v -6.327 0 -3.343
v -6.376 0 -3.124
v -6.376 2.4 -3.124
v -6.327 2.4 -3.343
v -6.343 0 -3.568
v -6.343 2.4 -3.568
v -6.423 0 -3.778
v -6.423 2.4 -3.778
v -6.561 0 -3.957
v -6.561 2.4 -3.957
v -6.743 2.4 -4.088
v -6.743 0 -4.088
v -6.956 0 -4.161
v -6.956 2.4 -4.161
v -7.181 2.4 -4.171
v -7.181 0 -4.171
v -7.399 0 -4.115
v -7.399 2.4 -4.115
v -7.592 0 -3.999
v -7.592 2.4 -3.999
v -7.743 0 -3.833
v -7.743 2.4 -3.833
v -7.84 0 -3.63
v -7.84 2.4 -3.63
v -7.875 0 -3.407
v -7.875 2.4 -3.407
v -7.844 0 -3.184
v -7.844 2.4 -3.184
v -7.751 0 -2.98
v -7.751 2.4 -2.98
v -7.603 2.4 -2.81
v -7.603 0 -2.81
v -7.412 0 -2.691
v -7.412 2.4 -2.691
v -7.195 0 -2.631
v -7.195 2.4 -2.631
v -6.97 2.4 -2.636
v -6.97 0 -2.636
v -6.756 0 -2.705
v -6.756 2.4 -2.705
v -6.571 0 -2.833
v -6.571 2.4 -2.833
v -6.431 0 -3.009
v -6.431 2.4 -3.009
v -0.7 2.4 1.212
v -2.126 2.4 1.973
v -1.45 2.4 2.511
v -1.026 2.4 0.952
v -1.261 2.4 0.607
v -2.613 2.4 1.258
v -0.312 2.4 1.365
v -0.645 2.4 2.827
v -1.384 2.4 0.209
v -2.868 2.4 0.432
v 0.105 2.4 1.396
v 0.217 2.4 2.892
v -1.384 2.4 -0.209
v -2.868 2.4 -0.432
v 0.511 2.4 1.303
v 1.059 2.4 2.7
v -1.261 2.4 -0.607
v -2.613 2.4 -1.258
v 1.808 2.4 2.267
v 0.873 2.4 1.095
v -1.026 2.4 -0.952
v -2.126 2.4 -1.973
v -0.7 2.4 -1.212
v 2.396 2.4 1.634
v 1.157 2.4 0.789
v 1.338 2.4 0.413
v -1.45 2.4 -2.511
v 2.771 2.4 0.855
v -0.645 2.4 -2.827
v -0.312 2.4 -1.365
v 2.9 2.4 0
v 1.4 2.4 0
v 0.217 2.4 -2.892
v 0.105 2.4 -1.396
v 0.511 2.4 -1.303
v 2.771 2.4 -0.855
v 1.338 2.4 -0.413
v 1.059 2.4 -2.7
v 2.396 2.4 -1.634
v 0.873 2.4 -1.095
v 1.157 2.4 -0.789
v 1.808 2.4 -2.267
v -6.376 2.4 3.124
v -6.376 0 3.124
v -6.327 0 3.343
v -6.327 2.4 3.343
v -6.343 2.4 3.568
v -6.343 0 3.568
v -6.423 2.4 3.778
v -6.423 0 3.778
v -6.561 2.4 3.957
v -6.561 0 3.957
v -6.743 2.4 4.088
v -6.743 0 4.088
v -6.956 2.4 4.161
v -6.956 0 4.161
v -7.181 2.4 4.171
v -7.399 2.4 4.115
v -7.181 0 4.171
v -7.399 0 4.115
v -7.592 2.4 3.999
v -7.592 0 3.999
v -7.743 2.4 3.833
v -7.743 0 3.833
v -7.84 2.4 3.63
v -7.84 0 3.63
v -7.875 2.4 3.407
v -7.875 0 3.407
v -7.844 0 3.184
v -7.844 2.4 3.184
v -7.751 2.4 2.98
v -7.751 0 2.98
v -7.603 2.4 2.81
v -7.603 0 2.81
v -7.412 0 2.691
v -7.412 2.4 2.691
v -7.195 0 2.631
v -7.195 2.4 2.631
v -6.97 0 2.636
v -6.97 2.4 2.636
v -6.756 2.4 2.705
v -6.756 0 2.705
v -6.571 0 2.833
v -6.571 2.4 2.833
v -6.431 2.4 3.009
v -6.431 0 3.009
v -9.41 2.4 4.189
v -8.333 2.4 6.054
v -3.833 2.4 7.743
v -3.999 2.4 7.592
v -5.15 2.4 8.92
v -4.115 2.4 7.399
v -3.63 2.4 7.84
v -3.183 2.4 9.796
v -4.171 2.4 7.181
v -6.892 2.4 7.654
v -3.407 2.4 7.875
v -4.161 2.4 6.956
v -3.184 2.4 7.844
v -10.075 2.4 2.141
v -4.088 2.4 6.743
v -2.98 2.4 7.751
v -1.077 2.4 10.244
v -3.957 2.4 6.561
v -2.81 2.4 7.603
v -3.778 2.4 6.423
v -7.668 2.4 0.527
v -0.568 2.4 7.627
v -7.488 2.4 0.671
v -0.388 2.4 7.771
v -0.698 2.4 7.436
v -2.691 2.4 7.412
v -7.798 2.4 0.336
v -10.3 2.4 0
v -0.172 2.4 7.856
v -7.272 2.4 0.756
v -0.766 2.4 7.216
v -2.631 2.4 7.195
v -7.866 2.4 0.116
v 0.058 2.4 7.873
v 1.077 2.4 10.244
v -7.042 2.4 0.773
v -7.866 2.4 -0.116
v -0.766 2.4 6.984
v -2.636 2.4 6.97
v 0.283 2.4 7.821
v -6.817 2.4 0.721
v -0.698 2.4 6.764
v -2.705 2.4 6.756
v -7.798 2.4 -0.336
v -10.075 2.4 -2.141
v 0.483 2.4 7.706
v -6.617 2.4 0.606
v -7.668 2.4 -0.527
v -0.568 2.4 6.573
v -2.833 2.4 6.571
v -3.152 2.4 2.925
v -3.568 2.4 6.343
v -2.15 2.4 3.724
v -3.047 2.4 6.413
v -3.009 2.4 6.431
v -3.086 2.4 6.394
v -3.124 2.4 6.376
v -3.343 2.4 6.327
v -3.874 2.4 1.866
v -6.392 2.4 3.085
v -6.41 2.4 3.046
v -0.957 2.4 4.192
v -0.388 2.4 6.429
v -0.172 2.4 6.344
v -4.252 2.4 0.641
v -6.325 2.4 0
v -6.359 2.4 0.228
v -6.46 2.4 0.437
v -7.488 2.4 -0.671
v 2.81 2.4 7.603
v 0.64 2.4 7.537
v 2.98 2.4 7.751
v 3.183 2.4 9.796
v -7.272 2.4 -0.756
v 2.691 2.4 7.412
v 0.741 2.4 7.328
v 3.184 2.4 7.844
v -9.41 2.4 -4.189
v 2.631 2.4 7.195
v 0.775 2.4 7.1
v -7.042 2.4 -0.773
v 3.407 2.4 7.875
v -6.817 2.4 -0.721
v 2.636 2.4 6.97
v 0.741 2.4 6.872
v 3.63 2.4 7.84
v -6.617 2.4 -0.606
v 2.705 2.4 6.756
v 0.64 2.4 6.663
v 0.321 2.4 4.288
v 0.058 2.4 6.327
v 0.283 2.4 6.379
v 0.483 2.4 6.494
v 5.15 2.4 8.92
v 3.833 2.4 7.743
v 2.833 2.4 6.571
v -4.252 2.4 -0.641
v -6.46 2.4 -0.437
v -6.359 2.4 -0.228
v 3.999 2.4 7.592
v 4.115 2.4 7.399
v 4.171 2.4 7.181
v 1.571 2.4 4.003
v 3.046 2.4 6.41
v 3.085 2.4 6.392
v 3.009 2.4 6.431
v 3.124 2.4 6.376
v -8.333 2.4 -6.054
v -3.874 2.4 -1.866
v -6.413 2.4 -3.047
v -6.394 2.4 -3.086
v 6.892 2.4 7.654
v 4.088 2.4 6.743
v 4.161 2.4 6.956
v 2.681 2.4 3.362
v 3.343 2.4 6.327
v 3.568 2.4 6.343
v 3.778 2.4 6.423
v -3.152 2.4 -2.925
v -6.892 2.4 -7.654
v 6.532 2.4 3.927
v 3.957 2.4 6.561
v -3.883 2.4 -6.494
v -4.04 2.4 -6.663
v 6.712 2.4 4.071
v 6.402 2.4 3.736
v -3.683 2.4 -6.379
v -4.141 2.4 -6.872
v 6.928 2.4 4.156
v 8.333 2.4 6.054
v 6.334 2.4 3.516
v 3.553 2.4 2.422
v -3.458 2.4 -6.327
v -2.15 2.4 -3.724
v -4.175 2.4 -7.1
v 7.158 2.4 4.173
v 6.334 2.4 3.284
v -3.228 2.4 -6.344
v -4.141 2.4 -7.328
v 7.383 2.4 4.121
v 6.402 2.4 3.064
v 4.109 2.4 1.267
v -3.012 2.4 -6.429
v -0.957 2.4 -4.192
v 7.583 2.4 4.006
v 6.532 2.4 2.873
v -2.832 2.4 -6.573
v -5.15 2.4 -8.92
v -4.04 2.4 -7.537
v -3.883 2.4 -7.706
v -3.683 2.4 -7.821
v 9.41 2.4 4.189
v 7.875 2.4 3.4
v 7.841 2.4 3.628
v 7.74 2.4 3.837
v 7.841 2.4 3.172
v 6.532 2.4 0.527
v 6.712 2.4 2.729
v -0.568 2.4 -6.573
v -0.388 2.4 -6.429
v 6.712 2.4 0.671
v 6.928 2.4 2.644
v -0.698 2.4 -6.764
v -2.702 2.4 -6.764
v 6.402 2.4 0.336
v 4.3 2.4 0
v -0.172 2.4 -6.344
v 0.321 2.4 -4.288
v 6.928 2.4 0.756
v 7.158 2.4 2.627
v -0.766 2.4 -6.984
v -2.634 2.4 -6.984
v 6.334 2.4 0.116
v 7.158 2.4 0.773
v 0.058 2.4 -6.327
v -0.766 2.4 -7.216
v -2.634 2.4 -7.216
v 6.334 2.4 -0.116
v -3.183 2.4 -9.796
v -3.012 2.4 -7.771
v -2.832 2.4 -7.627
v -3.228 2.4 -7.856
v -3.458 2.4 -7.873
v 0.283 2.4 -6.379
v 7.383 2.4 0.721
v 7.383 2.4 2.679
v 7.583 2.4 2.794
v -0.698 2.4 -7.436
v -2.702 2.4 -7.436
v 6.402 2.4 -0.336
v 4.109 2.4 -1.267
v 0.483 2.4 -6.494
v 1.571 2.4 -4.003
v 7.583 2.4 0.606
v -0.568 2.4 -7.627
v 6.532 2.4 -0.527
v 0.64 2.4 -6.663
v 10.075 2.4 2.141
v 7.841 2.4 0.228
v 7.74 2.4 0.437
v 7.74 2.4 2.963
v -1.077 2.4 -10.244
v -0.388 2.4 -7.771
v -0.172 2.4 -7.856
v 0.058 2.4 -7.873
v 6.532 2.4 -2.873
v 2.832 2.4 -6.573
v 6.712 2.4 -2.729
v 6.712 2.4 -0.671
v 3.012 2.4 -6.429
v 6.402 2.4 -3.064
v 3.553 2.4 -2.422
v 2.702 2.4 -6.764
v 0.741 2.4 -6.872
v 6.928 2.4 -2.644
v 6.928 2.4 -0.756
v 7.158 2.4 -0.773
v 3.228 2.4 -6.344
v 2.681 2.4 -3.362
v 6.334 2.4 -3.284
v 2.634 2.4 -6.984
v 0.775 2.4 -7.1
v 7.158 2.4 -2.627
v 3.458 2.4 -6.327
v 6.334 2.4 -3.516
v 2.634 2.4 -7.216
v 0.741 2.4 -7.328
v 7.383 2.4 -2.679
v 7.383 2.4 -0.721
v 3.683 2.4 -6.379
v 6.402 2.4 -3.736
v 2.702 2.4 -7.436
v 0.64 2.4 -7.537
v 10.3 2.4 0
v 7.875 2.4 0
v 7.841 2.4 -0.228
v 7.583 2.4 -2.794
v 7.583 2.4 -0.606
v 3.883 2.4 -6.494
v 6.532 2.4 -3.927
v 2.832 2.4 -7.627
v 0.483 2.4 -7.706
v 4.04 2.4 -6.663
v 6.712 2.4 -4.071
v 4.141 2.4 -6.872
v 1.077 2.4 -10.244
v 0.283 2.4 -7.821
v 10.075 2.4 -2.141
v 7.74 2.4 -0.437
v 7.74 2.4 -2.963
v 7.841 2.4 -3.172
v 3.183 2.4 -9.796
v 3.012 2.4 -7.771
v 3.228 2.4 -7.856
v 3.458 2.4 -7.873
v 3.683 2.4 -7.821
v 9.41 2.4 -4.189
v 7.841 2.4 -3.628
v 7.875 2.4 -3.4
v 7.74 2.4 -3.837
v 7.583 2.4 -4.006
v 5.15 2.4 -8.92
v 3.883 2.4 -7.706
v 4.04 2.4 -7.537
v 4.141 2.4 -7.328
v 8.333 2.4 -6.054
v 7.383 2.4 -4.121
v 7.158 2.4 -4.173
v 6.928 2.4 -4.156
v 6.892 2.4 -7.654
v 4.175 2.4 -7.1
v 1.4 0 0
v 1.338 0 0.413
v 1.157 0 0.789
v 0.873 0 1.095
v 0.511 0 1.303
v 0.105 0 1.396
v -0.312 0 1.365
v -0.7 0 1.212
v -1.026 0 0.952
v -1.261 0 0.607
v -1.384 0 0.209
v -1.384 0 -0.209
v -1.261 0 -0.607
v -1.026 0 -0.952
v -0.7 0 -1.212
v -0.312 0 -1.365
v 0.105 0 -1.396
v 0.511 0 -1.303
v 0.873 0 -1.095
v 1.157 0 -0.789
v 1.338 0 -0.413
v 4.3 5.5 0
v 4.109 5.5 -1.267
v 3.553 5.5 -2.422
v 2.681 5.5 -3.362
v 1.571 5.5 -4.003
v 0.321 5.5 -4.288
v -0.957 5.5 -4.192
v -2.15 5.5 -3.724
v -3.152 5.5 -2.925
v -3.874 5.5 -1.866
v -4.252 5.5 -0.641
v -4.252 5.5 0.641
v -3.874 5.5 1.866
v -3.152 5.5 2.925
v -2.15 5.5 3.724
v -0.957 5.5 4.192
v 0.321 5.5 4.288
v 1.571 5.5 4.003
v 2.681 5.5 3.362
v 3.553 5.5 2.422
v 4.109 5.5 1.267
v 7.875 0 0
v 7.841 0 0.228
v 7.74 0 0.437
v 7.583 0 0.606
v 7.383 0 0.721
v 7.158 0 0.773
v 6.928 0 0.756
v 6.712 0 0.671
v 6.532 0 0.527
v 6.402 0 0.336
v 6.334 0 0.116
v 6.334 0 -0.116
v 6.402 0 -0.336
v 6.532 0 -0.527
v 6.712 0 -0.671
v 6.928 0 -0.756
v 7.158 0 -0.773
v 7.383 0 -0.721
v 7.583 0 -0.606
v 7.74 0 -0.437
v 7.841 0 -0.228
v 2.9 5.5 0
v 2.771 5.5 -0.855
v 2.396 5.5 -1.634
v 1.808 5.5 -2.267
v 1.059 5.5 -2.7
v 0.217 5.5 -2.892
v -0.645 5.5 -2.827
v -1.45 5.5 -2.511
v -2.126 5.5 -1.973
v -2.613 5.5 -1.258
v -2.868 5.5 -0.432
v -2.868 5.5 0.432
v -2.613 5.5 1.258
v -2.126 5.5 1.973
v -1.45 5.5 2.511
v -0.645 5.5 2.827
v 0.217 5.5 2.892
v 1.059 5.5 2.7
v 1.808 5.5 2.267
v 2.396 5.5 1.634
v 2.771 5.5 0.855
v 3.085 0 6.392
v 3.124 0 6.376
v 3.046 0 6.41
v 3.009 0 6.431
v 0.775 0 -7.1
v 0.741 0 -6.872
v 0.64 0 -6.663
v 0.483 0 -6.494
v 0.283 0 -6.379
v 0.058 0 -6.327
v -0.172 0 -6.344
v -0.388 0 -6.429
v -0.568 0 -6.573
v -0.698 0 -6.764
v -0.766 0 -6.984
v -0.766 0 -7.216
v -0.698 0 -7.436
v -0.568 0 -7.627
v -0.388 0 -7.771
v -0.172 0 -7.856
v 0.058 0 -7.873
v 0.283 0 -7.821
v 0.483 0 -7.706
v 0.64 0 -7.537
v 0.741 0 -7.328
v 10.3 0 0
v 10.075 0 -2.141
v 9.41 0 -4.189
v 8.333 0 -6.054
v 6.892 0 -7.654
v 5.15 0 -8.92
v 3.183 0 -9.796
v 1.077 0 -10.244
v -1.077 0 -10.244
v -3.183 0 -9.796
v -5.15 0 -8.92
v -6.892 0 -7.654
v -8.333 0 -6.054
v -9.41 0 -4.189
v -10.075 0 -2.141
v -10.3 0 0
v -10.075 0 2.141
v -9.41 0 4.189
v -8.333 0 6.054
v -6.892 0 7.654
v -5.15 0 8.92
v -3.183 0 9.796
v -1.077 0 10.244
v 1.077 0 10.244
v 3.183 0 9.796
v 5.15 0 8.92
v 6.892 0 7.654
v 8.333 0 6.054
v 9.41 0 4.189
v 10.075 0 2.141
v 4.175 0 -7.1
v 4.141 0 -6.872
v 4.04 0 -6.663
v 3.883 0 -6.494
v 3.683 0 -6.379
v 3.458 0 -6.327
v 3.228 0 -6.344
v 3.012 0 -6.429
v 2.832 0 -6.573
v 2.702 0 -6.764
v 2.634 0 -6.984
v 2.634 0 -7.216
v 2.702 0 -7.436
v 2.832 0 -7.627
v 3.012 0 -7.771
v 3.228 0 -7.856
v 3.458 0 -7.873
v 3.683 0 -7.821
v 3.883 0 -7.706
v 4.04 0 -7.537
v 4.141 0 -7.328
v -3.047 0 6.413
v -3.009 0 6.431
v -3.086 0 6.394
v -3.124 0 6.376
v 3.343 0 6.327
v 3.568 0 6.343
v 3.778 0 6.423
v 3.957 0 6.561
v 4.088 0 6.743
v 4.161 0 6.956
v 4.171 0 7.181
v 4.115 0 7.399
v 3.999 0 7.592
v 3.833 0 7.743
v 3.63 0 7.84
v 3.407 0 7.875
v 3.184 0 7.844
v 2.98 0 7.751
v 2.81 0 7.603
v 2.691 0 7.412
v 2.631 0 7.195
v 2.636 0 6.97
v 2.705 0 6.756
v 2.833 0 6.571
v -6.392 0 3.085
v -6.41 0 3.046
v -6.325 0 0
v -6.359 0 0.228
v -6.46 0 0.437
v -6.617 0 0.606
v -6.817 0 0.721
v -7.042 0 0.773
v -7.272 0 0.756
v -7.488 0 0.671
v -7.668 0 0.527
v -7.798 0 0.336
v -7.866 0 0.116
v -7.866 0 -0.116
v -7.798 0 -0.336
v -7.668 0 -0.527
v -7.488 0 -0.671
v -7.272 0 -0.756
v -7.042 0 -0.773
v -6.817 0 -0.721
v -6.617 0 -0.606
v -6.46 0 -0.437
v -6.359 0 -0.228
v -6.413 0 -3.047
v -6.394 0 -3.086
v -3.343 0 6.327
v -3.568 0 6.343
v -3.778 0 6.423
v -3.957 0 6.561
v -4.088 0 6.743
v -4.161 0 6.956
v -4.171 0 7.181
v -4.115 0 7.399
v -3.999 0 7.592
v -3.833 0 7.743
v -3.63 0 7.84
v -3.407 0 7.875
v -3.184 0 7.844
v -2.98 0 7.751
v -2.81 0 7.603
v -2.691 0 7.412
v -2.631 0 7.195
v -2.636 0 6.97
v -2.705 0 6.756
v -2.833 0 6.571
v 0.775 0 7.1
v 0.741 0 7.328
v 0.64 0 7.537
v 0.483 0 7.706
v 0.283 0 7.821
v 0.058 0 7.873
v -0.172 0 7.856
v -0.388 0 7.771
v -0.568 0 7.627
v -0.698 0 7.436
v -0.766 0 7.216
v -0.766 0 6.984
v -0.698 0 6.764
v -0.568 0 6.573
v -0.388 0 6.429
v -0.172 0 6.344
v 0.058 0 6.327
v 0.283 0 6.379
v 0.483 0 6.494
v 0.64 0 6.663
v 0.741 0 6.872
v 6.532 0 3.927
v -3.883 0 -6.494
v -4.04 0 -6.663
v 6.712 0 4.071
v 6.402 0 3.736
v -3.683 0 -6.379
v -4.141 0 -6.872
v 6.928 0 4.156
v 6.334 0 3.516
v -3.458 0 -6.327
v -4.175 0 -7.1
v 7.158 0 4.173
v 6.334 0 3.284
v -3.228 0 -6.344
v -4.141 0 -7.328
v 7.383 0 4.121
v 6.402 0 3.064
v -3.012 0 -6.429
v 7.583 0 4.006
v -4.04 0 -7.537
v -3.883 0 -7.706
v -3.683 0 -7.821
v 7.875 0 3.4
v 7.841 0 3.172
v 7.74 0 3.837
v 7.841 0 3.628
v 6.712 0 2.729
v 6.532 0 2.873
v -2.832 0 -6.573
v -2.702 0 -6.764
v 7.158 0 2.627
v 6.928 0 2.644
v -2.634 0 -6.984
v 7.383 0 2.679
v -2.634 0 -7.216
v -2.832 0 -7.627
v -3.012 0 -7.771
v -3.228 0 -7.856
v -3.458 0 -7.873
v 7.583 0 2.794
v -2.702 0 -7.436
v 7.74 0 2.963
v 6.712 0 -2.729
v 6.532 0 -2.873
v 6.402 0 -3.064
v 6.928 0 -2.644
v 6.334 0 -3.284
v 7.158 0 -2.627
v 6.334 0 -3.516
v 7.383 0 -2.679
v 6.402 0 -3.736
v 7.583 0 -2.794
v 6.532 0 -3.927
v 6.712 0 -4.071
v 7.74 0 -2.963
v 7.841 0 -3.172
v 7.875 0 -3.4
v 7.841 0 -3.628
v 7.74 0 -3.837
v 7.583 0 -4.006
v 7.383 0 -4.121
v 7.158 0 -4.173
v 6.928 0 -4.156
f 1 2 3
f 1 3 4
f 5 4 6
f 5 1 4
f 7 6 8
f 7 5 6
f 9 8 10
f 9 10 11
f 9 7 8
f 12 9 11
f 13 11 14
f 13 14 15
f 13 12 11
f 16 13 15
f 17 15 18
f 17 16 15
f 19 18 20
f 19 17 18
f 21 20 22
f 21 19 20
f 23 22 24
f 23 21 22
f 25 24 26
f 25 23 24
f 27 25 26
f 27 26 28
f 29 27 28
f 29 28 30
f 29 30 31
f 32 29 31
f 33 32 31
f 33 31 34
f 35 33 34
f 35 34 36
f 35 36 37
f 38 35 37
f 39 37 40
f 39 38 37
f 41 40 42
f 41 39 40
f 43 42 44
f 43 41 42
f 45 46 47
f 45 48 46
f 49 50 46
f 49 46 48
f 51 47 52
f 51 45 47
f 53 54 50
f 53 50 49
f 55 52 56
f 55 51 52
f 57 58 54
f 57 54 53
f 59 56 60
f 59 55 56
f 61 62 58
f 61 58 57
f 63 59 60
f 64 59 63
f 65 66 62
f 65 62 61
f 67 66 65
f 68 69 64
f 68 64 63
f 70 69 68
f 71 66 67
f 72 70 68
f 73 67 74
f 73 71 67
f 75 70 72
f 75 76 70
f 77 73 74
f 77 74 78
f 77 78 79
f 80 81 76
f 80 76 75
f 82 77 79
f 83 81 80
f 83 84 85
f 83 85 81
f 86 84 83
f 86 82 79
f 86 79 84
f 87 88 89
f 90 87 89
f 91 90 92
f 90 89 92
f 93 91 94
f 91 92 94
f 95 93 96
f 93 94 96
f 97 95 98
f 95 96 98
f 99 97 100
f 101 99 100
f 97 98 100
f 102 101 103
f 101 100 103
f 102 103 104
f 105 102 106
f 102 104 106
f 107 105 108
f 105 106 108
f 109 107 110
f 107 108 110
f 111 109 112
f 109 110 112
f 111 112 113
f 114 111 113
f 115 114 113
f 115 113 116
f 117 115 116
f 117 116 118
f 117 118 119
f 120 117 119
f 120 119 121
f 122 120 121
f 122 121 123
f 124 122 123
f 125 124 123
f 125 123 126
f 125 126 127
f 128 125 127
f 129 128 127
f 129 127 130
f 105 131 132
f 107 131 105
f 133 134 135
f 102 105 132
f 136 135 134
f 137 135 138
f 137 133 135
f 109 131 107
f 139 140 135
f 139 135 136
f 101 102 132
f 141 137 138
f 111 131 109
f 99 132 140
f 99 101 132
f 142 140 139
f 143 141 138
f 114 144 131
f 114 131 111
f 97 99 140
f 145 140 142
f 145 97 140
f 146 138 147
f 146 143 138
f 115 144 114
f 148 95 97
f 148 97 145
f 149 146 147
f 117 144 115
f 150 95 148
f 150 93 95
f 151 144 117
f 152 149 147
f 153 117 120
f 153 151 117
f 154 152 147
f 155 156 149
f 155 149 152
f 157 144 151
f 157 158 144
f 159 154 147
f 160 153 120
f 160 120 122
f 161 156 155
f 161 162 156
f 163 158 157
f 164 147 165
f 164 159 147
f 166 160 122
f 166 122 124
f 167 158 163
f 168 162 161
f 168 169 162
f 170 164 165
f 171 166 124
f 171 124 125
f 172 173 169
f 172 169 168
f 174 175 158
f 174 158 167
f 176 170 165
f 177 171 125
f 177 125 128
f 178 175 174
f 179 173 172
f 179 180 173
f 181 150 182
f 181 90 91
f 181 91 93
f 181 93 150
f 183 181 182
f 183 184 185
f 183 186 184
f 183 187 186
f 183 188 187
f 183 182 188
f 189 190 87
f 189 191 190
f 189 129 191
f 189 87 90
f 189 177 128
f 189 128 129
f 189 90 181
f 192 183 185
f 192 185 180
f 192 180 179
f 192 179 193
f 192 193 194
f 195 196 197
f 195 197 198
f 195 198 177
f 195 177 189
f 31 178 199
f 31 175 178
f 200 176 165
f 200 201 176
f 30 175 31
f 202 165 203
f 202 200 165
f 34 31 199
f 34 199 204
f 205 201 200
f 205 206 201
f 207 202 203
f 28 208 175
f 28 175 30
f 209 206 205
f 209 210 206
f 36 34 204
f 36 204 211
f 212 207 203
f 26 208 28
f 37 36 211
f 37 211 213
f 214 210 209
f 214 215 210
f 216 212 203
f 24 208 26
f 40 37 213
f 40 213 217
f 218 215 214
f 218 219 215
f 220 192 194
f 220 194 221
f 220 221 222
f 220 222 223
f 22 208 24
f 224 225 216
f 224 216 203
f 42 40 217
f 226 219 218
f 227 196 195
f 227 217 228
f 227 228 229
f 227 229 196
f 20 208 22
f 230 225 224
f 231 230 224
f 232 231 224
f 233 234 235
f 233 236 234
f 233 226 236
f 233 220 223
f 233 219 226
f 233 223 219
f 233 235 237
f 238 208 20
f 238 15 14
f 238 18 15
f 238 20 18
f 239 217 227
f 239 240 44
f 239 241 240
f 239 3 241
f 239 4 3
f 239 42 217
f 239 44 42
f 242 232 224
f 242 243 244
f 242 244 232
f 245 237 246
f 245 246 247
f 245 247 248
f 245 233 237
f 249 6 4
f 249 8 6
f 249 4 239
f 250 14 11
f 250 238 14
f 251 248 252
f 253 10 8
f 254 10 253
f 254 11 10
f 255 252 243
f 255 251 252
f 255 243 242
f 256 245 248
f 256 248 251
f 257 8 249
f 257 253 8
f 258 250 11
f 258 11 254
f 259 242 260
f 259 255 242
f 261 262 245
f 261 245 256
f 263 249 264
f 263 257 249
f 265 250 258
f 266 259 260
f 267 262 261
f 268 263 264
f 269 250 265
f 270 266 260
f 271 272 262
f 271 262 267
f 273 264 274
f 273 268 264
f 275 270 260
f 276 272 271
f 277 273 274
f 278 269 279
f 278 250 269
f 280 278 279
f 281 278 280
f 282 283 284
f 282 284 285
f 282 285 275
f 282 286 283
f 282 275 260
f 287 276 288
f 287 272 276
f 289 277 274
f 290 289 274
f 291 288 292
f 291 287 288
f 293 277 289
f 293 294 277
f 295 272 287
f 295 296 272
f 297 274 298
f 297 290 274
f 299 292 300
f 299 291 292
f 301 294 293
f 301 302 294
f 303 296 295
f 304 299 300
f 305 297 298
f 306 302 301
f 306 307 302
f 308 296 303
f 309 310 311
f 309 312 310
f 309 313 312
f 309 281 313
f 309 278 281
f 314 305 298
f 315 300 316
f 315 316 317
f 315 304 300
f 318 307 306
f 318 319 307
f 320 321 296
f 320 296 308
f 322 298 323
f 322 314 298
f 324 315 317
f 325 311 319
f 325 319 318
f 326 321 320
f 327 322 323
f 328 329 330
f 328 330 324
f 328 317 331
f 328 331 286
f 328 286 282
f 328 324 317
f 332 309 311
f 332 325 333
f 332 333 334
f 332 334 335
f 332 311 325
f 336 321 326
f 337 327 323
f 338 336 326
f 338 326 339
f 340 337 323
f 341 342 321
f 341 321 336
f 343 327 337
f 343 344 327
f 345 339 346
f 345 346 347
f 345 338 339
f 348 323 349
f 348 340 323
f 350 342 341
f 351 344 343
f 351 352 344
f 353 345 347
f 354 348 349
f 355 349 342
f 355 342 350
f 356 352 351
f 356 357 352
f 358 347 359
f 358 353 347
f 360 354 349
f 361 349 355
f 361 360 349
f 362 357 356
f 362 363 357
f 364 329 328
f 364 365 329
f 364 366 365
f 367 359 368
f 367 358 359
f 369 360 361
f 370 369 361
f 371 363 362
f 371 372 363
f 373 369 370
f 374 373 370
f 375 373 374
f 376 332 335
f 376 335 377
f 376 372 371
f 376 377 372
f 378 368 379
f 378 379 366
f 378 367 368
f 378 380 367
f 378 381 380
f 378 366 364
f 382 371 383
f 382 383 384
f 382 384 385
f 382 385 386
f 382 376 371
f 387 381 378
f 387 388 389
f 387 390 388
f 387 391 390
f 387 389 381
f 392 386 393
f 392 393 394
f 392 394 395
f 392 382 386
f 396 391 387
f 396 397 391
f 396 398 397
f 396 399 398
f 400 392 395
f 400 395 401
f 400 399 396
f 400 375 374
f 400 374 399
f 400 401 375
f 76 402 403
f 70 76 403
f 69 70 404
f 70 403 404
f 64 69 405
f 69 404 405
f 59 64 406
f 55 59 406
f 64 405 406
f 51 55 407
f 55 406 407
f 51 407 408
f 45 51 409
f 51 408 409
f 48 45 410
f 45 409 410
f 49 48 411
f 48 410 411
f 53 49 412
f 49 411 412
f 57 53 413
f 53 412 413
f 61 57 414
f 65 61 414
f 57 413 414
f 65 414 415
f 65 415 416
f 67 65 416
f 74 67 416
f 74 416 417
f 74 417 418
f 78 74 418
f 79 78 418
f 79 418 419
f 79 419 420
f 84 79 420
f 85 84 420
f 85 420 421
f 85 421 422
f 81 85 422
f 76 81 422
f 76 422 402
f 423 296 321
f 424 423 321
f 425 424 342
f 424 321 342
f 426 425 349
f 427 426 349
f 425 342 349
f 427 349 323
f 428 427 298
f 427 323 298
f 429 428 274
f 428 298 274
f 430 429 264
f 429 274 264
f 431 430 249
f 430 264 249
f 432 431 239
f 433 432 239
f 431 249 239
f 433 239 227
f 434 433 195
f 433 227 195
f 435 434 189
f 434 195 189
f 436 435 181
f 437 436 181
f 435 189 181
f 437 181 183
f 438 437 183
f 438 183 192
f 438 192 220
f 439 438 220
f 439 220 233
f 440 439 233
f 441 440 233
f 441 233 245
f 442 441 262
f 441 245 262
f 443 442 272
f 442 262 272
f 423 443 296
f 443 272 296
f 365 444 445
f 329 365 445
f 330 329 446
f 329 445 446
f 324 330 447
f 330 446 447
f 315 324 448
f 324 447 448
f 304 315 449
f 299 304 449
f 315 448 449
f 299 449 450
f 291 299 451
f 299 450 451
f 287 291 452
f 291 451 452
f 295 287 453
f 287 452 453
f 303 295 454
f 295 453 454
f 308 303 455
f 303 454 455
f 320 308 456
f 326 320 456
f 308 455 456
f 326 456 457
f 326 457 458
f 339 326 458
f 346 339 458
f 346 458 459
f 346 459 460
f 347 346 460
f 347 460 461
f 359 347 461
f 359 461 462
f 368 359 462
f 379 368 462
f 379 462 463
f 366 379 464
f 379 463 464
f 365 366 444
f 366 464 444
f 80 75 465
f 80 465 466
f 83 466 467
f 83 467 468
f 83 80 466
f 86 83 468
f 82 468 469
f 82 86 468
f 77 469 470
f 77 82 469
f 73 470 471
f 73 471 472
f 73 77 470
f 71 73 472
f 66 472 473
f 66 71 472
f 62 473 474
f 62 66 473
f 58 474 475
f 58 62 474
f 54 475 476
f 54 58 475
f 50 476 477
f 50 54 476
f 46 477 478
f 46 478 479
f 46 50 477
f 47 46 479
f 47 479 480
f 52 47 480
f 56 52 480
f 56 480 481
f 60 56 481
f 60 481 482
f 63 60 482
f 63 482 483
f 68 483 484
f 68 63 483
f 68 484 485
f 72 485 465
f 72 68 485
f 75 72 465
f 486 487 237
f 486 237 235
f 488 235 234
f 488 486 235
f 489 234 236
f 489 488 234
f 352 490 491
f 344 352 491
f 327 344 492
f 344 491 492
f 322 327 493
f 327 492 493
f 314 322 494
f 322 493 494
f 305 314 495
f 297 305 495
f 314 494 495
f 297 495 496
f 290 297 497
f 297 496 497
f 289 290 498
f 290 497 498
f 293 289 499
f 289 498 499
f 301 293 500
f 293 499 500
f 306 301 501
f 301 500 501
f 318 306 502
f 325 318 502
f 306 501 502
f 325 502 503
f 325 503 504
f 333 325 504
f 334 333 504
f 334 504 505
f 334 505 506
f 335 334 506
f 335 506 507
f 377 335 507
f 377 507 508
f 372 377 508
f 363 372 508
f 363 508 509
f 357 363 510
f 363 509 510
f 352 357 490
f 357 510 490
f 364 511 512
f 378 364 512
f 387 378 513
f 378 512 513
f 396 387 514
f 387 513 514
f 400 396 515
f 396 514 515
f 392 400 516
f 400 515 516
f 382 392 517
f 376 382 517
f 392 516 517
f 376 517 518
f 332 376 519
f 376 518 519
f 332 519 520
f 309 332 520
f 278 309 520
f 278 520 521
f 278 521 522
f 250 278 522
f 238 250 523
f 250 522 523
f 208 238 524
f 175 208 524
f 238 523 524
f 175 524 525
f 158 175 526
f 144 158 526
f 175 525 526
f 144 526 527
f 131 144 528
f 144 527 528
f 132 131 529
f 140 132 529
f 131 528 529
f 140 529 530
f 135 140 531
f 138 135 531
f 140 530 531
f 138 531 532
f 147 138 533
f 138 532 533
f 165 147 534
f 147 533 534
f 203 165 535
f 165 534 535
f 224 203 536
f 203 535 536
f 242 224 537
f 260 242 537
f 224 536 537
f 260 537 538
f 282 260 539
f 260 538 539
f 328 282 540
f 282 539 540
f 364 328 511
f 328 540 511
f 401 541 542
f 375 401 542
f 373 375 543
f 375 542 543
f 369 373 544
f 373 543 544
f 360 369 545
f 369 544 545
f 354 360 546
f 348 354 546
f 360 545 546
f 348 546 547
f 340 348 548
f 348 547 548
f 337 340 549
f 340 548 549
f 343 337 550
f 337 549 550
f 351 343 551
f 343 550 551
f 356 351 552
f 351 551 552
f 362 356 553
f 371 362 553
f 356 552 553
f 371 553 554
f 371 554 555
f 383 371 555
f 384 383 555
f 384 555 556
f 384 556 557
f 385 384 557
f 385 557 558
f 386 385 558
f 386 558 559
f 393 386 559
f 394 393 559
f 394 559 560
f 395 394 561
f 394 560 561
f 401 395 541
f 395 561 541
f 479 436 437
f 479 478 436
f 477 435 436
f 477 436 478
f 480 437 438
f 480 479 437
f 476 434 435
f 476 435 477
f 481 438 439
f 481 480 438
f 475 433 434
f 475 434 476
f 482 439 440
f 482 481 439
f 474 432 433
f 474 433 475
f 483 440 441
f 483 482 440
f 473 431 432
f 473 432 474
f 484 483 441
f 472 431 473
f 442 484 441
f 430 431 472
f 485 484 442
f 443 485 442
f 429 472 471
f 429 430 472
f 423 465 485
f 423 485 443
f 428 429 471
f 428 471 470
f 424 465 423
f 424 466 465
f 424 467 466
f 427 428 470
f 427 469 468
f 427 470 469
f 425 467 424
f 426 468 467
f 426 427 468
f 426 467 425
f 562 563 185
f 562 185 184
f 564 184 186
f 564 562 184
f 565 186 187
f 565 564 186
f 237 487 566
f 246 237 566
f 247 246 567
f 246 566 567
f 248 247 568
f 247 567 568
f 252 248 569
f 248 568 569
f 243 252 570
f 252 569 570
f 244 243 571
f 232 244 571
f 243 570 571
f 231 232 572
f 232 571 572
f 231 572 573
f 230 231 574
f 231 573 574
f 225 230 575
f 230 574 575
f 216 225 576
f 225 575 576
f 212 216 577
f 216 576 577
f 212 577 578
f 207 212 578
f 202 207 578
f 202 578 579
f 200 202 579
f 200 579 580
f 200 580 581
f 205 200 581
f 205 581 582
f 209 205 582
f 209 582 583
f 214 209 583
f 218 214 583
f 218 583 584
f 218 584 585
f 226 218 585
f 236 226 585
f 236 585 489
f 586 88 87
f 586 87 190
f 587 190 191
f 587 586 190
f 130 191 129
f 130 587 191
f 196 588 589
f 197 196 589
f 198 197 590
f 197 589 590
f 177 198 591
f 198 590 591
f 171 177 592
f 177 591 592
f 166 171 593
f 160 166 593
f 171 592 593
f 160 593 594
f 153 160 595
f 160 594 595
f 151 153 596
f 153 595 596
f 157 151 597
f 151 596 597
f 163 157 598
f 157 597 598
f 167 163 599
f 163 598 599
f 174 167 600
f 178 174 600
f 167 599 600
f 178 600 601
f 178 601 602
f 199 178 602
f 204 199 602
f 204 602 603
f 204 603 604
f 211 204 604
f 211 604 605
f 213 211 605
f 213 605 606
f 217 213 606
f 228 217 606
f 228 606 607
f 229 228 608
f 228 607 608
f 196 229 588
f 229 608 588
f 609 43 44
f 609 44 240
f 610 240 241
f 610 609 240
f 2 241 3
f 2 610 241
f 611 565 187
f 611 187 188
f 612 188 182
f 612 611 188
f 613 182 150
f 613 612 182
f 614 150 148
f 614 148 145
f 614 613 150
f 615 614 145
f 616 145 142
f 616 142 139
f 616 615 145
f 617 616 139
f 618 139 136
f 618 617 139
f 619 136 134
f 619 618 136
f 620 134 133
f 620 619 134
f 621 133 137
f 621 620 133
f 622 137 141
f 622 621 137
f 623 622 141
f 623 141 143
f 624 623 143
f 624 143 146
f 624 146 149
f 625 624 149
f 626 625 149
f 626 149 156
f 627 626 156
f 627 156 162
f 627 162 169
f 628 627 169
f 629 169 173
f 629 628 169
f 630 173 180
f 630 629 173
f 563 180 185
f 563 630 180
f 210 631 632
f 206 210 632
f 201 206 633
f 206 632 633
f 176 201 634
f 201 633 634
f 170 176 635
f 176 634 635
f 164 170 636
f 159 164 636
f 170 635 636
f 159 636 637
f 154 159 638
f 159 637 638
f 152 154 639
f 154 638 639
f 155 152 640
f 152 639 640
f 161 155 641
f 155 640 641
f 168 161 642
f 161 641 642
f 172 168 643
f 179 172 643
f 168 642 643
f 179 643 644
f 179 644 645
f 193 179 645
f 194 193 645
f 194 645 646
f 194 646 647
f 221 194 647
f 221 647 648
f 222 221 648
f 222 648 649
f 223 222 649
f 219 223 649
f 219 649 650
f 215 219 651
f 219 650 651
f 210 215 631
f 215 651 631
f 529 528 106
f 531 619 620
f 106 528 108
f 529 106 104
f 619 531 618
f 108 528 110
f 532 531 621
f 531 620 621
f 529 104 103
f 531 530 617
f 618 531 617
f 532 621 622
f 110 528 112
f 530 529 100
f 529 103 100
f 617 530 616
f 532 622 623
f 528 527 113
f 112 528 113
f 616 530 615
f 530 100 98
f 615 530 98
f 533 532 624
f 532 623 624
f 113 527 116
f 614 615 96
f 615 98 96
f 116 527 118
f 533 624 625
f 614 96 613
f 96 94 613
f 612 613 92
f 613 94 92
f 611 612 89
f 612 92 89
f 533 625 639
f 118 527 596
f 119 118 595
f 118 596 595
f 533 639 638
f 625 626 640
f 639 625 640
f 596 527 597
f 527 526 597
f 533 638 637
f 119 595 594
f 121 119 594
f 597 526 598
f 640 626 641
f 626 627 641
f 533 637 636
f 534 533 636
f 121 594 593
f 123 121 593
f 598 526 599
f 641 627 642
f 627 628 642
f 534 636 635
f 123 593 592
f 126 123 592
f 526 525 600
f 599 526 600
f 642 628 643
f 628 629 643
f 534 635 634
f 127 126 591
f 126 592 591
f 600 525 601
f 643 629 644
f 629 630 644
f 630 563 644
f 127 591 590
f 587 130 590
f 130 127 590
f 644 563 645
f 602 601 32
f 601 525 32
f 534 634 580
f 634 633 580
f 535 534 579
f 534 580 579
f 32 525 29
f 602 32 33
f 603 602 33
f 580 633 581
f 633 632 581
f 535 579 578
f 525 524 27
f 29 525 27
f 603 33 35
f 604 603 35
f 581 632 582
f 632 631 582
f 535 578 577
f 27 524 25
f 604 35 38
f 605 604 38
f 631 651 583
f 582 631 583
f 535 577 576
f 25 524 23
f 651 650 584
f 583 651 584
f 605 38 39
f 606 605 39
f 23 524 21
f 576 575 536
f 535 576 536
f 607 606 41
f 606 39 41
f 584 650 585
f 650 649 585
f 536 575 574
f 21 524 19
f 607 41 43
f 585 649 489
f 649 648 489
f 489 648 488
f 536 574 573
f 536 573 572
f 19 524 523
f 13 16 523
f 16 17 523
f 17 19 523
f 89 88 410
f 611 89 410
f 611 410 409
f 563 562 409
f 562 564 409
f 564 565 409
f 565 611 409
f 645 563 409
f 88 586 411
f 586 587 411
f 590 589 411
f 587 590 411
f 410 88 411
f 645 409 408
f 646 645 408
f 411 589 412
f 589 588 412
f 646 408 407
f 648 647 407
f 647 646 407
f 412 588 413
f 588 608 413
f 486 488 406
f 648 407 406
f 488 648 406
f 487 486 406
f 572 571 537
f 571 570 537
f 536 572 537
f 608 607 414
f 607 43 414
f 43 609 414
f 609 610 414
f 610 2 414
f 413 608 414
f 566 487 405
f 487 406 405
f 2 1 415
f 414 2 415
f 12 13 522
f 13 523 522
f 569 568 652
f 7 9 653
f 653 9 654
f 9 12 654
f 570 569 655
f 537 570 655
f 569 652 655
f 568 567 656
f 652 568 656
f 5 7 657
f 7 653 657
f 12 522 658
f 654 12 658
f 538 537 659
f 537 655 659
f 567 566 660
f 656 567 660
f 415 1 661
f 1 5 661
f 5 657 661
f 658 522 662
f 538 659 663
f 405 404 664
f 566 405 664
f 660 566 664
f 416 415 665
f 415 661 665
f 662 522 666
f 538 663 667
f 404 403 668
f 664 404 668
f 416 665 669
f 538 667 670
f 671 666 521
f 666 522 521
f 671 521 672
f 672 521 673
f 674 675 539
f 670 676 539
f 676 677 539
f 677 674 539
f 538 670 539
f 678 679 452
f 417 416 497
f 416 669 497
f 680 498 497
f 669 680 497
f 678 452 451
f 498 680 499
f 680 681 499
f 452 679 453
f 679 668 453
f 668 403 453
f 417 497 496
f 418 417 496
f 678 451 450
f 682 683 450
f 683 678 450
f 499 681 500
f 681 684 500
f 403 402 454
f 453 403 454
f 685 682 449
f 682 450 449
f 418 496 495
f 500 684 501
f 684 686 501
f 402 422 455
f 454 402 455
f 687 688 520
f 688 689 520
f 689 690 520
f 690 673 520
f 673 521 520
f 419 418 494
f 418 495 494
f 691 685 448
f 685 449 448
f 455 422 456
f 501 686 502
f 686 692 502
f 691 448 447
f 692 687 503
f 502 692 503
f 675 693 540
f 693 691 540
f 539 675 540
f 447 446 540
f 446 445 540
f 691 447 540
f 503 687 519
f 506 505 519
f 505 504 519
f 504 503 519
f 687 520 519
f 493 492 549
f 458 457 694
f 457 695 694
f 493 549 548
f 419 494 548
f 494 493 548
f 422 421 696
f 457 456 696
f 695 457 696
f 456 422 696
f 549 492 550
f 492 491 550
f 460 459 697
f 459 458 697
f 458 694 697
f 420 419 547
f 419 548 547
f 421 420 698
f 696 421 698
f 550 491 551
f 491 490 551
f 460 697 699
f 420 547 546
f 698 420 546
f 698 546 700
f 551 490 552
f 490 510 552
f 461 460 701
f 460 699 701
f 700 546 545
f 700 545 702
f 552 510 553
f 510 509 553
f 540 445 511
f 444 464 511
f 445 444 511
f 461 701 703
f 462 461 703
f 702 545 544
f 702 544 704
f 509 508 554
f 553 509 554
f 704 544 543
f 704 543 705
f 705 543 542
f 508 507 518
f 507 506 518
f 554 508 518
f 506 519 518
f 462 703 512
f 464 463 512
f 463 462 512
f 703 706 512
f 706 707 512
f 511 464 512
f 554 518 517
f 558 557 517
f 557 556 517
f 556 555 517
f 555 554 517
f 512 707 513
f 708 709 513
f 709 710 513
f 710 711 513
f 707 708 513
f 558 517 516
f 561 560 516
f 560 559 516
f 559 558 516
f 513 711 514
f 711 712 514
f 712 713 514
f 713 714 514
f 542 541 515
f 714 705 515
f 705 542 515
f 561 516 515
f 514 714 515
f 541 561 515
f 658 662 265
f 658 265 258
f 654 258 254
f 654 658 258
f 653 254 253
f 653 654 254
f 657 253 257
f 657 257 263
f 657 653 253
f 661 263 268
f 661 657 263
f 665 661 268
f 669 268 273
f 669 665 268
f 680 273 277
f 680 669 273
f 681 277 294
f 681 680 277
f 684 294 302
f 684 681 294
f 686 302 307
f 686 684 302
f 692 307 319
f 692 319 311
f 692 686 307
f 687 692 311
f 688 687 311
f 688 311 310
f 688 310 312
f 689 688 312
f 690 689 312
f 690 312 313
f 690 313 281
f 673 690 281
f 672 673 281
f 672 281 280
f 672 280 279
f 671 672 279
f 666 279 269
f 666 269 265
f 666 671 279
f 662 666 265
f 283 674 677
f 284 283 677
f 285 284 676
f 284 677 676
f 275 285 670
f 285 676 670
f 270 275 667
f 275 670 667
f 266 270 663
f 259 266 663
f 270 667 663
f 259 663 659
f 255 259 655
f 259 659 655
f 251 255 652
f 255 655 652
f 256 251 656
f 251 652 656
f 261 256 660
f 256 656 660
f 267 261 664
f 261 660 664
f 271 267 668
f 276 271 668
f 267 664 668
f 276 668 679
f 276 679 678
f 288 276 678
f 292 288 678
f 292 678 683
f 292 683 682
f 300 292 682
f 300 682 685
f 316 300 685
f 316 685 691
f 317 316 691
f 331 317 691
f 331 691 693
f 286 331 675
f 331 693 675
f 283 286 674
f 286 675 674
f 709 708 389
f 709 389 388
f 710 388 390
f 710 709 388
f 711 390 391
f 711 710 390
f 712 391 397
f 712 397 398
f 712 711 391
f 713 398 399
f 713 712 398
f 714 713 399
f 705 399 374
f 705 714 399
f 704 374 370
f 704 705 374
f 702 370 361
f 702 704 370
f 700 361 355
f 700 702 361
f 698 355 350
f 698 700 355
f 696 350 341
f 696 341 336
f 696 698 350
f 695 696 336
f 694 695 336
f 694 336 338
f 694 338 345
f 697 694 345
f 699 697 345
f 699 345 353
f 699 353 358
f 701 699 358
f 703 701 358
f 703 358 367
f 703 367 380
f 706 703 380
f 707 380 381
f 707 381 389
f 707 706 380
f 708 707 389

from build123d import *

# Parameters (mm, degrees)
SKETCH_1_R          = 10.3
EXTRUDE_1_DEPTH     = 2.4
SKETCH_2_R          = 4.3
SKETCH_2_R_2        = 2.9
EXTRUDE_2_DEPTH     = 3.1
SKETCH_3_R          = 0.775
CUT_EXTRUDE_1_DEPTH = 2.4
CUT_EXTRUDE_2_REACH = 7.5
SKETCH_4_R          = 1.4


with BuildPart() as part:
    # 草图1 → 凸台-拉伸1 (new body)
    with BuildSketch(Plane(origin=(0, 0, 0), x_dir=(1, 0, 0), z_dir=(0, 1, 0))):
        Circle(SKETCH_1_R)
    extrude(amount=EXTRUDE_1_DEPTH)

    # 草图2 → 凸台-拉伸2 (add)
    with BuildSketch(Plane(origin=(0, 2.4, 0), x_dir=(1, 0, 0), z_dir=(0, 1, 0))):
        Circle(SKETCH_2_R)
        Circle(SKETCH_2_R_2, mode=Mode.SUBTRACT)
    extrude(amount=EXTRUDE_2_DEPTH)

    # 草图3 → 切除-拉伸1 (cut)
    with BuildSketch(Plane.XZ):
        with Locations((0, 7.1)):
            Circle(SKETCH_3_R)
        with BuildLine():
            ThreePointArc((3.009055484, 6.430830825), (3.066525057, 6.403625854), (3.123748696, 6.375907315))
            ThreePointArc((3.123748696, 6.375907315), (3.734726327, 7.798987329), (3.009055484, 6.430830825))
        make_face()
        with BuildLine():
            ThreePointArc((-6.430830825, 3.009055484), (-6.403625854, 3.066525057), (-6.375907315, 3.123748696))
            ThreePointArc((-6.375907315, 3.123748696), (-7.798987329, 3.734726327), (-6.430830825, 3.009055484))
        make_face()
        with Locations((7.1, 3.4)):
            Circle(SKETCH_3_R)
        with Locations((-7.1, 0)):
            Circle(SKETCH_3_R)
        with Locations((7.1, 0)):
            Circle(SKETCH_3_R)
        with Locations((0, -7.1)):
            Circle(SKETCH_3_R)
        with Locations((3.4, -7.1)):
            Circle(SKETCH_3_R)
    cut_extrude_1 = extrude(amount=-CUT_EXTRUDE_1_DEPTH, mode=Mode.SUBTRACT)

    # 镜向1: 切除-拉伸1 across plane
    add(cut_extrude_1.mirror(Plane(origin=(0, 0, 0), x_dir=(0, 0, 1), z_dir=(1, 0, 0))), mode=Mode.SUBTRACT)

    # 镜向2: 切除-拉伸1 across plane
    add(cut_extrude_1.mirror(Plane.XY), mode=Mode.SUBTRACT)

    # 草图4 → 切除-拉伸2 (cut, up to next)
    with BuildSketch(Plane.XZ, mode=Mode.PRIVATE) as cut_extrude_2_sk1:
        Circle(SKETCH_4_R)
    cut_extrude_2_tool1 = extrude(cut_extrude_2_sk1.sketch, amount=-CUT_EXTRUDE_2_REACH, mode=Mode.PRIVATE) & part.part
    add(cut_extrude_2_tool1.solids().sort_by_distance((0, 0, 0))[0], mode=Mode.SUBTRACT)


solid = part.part
